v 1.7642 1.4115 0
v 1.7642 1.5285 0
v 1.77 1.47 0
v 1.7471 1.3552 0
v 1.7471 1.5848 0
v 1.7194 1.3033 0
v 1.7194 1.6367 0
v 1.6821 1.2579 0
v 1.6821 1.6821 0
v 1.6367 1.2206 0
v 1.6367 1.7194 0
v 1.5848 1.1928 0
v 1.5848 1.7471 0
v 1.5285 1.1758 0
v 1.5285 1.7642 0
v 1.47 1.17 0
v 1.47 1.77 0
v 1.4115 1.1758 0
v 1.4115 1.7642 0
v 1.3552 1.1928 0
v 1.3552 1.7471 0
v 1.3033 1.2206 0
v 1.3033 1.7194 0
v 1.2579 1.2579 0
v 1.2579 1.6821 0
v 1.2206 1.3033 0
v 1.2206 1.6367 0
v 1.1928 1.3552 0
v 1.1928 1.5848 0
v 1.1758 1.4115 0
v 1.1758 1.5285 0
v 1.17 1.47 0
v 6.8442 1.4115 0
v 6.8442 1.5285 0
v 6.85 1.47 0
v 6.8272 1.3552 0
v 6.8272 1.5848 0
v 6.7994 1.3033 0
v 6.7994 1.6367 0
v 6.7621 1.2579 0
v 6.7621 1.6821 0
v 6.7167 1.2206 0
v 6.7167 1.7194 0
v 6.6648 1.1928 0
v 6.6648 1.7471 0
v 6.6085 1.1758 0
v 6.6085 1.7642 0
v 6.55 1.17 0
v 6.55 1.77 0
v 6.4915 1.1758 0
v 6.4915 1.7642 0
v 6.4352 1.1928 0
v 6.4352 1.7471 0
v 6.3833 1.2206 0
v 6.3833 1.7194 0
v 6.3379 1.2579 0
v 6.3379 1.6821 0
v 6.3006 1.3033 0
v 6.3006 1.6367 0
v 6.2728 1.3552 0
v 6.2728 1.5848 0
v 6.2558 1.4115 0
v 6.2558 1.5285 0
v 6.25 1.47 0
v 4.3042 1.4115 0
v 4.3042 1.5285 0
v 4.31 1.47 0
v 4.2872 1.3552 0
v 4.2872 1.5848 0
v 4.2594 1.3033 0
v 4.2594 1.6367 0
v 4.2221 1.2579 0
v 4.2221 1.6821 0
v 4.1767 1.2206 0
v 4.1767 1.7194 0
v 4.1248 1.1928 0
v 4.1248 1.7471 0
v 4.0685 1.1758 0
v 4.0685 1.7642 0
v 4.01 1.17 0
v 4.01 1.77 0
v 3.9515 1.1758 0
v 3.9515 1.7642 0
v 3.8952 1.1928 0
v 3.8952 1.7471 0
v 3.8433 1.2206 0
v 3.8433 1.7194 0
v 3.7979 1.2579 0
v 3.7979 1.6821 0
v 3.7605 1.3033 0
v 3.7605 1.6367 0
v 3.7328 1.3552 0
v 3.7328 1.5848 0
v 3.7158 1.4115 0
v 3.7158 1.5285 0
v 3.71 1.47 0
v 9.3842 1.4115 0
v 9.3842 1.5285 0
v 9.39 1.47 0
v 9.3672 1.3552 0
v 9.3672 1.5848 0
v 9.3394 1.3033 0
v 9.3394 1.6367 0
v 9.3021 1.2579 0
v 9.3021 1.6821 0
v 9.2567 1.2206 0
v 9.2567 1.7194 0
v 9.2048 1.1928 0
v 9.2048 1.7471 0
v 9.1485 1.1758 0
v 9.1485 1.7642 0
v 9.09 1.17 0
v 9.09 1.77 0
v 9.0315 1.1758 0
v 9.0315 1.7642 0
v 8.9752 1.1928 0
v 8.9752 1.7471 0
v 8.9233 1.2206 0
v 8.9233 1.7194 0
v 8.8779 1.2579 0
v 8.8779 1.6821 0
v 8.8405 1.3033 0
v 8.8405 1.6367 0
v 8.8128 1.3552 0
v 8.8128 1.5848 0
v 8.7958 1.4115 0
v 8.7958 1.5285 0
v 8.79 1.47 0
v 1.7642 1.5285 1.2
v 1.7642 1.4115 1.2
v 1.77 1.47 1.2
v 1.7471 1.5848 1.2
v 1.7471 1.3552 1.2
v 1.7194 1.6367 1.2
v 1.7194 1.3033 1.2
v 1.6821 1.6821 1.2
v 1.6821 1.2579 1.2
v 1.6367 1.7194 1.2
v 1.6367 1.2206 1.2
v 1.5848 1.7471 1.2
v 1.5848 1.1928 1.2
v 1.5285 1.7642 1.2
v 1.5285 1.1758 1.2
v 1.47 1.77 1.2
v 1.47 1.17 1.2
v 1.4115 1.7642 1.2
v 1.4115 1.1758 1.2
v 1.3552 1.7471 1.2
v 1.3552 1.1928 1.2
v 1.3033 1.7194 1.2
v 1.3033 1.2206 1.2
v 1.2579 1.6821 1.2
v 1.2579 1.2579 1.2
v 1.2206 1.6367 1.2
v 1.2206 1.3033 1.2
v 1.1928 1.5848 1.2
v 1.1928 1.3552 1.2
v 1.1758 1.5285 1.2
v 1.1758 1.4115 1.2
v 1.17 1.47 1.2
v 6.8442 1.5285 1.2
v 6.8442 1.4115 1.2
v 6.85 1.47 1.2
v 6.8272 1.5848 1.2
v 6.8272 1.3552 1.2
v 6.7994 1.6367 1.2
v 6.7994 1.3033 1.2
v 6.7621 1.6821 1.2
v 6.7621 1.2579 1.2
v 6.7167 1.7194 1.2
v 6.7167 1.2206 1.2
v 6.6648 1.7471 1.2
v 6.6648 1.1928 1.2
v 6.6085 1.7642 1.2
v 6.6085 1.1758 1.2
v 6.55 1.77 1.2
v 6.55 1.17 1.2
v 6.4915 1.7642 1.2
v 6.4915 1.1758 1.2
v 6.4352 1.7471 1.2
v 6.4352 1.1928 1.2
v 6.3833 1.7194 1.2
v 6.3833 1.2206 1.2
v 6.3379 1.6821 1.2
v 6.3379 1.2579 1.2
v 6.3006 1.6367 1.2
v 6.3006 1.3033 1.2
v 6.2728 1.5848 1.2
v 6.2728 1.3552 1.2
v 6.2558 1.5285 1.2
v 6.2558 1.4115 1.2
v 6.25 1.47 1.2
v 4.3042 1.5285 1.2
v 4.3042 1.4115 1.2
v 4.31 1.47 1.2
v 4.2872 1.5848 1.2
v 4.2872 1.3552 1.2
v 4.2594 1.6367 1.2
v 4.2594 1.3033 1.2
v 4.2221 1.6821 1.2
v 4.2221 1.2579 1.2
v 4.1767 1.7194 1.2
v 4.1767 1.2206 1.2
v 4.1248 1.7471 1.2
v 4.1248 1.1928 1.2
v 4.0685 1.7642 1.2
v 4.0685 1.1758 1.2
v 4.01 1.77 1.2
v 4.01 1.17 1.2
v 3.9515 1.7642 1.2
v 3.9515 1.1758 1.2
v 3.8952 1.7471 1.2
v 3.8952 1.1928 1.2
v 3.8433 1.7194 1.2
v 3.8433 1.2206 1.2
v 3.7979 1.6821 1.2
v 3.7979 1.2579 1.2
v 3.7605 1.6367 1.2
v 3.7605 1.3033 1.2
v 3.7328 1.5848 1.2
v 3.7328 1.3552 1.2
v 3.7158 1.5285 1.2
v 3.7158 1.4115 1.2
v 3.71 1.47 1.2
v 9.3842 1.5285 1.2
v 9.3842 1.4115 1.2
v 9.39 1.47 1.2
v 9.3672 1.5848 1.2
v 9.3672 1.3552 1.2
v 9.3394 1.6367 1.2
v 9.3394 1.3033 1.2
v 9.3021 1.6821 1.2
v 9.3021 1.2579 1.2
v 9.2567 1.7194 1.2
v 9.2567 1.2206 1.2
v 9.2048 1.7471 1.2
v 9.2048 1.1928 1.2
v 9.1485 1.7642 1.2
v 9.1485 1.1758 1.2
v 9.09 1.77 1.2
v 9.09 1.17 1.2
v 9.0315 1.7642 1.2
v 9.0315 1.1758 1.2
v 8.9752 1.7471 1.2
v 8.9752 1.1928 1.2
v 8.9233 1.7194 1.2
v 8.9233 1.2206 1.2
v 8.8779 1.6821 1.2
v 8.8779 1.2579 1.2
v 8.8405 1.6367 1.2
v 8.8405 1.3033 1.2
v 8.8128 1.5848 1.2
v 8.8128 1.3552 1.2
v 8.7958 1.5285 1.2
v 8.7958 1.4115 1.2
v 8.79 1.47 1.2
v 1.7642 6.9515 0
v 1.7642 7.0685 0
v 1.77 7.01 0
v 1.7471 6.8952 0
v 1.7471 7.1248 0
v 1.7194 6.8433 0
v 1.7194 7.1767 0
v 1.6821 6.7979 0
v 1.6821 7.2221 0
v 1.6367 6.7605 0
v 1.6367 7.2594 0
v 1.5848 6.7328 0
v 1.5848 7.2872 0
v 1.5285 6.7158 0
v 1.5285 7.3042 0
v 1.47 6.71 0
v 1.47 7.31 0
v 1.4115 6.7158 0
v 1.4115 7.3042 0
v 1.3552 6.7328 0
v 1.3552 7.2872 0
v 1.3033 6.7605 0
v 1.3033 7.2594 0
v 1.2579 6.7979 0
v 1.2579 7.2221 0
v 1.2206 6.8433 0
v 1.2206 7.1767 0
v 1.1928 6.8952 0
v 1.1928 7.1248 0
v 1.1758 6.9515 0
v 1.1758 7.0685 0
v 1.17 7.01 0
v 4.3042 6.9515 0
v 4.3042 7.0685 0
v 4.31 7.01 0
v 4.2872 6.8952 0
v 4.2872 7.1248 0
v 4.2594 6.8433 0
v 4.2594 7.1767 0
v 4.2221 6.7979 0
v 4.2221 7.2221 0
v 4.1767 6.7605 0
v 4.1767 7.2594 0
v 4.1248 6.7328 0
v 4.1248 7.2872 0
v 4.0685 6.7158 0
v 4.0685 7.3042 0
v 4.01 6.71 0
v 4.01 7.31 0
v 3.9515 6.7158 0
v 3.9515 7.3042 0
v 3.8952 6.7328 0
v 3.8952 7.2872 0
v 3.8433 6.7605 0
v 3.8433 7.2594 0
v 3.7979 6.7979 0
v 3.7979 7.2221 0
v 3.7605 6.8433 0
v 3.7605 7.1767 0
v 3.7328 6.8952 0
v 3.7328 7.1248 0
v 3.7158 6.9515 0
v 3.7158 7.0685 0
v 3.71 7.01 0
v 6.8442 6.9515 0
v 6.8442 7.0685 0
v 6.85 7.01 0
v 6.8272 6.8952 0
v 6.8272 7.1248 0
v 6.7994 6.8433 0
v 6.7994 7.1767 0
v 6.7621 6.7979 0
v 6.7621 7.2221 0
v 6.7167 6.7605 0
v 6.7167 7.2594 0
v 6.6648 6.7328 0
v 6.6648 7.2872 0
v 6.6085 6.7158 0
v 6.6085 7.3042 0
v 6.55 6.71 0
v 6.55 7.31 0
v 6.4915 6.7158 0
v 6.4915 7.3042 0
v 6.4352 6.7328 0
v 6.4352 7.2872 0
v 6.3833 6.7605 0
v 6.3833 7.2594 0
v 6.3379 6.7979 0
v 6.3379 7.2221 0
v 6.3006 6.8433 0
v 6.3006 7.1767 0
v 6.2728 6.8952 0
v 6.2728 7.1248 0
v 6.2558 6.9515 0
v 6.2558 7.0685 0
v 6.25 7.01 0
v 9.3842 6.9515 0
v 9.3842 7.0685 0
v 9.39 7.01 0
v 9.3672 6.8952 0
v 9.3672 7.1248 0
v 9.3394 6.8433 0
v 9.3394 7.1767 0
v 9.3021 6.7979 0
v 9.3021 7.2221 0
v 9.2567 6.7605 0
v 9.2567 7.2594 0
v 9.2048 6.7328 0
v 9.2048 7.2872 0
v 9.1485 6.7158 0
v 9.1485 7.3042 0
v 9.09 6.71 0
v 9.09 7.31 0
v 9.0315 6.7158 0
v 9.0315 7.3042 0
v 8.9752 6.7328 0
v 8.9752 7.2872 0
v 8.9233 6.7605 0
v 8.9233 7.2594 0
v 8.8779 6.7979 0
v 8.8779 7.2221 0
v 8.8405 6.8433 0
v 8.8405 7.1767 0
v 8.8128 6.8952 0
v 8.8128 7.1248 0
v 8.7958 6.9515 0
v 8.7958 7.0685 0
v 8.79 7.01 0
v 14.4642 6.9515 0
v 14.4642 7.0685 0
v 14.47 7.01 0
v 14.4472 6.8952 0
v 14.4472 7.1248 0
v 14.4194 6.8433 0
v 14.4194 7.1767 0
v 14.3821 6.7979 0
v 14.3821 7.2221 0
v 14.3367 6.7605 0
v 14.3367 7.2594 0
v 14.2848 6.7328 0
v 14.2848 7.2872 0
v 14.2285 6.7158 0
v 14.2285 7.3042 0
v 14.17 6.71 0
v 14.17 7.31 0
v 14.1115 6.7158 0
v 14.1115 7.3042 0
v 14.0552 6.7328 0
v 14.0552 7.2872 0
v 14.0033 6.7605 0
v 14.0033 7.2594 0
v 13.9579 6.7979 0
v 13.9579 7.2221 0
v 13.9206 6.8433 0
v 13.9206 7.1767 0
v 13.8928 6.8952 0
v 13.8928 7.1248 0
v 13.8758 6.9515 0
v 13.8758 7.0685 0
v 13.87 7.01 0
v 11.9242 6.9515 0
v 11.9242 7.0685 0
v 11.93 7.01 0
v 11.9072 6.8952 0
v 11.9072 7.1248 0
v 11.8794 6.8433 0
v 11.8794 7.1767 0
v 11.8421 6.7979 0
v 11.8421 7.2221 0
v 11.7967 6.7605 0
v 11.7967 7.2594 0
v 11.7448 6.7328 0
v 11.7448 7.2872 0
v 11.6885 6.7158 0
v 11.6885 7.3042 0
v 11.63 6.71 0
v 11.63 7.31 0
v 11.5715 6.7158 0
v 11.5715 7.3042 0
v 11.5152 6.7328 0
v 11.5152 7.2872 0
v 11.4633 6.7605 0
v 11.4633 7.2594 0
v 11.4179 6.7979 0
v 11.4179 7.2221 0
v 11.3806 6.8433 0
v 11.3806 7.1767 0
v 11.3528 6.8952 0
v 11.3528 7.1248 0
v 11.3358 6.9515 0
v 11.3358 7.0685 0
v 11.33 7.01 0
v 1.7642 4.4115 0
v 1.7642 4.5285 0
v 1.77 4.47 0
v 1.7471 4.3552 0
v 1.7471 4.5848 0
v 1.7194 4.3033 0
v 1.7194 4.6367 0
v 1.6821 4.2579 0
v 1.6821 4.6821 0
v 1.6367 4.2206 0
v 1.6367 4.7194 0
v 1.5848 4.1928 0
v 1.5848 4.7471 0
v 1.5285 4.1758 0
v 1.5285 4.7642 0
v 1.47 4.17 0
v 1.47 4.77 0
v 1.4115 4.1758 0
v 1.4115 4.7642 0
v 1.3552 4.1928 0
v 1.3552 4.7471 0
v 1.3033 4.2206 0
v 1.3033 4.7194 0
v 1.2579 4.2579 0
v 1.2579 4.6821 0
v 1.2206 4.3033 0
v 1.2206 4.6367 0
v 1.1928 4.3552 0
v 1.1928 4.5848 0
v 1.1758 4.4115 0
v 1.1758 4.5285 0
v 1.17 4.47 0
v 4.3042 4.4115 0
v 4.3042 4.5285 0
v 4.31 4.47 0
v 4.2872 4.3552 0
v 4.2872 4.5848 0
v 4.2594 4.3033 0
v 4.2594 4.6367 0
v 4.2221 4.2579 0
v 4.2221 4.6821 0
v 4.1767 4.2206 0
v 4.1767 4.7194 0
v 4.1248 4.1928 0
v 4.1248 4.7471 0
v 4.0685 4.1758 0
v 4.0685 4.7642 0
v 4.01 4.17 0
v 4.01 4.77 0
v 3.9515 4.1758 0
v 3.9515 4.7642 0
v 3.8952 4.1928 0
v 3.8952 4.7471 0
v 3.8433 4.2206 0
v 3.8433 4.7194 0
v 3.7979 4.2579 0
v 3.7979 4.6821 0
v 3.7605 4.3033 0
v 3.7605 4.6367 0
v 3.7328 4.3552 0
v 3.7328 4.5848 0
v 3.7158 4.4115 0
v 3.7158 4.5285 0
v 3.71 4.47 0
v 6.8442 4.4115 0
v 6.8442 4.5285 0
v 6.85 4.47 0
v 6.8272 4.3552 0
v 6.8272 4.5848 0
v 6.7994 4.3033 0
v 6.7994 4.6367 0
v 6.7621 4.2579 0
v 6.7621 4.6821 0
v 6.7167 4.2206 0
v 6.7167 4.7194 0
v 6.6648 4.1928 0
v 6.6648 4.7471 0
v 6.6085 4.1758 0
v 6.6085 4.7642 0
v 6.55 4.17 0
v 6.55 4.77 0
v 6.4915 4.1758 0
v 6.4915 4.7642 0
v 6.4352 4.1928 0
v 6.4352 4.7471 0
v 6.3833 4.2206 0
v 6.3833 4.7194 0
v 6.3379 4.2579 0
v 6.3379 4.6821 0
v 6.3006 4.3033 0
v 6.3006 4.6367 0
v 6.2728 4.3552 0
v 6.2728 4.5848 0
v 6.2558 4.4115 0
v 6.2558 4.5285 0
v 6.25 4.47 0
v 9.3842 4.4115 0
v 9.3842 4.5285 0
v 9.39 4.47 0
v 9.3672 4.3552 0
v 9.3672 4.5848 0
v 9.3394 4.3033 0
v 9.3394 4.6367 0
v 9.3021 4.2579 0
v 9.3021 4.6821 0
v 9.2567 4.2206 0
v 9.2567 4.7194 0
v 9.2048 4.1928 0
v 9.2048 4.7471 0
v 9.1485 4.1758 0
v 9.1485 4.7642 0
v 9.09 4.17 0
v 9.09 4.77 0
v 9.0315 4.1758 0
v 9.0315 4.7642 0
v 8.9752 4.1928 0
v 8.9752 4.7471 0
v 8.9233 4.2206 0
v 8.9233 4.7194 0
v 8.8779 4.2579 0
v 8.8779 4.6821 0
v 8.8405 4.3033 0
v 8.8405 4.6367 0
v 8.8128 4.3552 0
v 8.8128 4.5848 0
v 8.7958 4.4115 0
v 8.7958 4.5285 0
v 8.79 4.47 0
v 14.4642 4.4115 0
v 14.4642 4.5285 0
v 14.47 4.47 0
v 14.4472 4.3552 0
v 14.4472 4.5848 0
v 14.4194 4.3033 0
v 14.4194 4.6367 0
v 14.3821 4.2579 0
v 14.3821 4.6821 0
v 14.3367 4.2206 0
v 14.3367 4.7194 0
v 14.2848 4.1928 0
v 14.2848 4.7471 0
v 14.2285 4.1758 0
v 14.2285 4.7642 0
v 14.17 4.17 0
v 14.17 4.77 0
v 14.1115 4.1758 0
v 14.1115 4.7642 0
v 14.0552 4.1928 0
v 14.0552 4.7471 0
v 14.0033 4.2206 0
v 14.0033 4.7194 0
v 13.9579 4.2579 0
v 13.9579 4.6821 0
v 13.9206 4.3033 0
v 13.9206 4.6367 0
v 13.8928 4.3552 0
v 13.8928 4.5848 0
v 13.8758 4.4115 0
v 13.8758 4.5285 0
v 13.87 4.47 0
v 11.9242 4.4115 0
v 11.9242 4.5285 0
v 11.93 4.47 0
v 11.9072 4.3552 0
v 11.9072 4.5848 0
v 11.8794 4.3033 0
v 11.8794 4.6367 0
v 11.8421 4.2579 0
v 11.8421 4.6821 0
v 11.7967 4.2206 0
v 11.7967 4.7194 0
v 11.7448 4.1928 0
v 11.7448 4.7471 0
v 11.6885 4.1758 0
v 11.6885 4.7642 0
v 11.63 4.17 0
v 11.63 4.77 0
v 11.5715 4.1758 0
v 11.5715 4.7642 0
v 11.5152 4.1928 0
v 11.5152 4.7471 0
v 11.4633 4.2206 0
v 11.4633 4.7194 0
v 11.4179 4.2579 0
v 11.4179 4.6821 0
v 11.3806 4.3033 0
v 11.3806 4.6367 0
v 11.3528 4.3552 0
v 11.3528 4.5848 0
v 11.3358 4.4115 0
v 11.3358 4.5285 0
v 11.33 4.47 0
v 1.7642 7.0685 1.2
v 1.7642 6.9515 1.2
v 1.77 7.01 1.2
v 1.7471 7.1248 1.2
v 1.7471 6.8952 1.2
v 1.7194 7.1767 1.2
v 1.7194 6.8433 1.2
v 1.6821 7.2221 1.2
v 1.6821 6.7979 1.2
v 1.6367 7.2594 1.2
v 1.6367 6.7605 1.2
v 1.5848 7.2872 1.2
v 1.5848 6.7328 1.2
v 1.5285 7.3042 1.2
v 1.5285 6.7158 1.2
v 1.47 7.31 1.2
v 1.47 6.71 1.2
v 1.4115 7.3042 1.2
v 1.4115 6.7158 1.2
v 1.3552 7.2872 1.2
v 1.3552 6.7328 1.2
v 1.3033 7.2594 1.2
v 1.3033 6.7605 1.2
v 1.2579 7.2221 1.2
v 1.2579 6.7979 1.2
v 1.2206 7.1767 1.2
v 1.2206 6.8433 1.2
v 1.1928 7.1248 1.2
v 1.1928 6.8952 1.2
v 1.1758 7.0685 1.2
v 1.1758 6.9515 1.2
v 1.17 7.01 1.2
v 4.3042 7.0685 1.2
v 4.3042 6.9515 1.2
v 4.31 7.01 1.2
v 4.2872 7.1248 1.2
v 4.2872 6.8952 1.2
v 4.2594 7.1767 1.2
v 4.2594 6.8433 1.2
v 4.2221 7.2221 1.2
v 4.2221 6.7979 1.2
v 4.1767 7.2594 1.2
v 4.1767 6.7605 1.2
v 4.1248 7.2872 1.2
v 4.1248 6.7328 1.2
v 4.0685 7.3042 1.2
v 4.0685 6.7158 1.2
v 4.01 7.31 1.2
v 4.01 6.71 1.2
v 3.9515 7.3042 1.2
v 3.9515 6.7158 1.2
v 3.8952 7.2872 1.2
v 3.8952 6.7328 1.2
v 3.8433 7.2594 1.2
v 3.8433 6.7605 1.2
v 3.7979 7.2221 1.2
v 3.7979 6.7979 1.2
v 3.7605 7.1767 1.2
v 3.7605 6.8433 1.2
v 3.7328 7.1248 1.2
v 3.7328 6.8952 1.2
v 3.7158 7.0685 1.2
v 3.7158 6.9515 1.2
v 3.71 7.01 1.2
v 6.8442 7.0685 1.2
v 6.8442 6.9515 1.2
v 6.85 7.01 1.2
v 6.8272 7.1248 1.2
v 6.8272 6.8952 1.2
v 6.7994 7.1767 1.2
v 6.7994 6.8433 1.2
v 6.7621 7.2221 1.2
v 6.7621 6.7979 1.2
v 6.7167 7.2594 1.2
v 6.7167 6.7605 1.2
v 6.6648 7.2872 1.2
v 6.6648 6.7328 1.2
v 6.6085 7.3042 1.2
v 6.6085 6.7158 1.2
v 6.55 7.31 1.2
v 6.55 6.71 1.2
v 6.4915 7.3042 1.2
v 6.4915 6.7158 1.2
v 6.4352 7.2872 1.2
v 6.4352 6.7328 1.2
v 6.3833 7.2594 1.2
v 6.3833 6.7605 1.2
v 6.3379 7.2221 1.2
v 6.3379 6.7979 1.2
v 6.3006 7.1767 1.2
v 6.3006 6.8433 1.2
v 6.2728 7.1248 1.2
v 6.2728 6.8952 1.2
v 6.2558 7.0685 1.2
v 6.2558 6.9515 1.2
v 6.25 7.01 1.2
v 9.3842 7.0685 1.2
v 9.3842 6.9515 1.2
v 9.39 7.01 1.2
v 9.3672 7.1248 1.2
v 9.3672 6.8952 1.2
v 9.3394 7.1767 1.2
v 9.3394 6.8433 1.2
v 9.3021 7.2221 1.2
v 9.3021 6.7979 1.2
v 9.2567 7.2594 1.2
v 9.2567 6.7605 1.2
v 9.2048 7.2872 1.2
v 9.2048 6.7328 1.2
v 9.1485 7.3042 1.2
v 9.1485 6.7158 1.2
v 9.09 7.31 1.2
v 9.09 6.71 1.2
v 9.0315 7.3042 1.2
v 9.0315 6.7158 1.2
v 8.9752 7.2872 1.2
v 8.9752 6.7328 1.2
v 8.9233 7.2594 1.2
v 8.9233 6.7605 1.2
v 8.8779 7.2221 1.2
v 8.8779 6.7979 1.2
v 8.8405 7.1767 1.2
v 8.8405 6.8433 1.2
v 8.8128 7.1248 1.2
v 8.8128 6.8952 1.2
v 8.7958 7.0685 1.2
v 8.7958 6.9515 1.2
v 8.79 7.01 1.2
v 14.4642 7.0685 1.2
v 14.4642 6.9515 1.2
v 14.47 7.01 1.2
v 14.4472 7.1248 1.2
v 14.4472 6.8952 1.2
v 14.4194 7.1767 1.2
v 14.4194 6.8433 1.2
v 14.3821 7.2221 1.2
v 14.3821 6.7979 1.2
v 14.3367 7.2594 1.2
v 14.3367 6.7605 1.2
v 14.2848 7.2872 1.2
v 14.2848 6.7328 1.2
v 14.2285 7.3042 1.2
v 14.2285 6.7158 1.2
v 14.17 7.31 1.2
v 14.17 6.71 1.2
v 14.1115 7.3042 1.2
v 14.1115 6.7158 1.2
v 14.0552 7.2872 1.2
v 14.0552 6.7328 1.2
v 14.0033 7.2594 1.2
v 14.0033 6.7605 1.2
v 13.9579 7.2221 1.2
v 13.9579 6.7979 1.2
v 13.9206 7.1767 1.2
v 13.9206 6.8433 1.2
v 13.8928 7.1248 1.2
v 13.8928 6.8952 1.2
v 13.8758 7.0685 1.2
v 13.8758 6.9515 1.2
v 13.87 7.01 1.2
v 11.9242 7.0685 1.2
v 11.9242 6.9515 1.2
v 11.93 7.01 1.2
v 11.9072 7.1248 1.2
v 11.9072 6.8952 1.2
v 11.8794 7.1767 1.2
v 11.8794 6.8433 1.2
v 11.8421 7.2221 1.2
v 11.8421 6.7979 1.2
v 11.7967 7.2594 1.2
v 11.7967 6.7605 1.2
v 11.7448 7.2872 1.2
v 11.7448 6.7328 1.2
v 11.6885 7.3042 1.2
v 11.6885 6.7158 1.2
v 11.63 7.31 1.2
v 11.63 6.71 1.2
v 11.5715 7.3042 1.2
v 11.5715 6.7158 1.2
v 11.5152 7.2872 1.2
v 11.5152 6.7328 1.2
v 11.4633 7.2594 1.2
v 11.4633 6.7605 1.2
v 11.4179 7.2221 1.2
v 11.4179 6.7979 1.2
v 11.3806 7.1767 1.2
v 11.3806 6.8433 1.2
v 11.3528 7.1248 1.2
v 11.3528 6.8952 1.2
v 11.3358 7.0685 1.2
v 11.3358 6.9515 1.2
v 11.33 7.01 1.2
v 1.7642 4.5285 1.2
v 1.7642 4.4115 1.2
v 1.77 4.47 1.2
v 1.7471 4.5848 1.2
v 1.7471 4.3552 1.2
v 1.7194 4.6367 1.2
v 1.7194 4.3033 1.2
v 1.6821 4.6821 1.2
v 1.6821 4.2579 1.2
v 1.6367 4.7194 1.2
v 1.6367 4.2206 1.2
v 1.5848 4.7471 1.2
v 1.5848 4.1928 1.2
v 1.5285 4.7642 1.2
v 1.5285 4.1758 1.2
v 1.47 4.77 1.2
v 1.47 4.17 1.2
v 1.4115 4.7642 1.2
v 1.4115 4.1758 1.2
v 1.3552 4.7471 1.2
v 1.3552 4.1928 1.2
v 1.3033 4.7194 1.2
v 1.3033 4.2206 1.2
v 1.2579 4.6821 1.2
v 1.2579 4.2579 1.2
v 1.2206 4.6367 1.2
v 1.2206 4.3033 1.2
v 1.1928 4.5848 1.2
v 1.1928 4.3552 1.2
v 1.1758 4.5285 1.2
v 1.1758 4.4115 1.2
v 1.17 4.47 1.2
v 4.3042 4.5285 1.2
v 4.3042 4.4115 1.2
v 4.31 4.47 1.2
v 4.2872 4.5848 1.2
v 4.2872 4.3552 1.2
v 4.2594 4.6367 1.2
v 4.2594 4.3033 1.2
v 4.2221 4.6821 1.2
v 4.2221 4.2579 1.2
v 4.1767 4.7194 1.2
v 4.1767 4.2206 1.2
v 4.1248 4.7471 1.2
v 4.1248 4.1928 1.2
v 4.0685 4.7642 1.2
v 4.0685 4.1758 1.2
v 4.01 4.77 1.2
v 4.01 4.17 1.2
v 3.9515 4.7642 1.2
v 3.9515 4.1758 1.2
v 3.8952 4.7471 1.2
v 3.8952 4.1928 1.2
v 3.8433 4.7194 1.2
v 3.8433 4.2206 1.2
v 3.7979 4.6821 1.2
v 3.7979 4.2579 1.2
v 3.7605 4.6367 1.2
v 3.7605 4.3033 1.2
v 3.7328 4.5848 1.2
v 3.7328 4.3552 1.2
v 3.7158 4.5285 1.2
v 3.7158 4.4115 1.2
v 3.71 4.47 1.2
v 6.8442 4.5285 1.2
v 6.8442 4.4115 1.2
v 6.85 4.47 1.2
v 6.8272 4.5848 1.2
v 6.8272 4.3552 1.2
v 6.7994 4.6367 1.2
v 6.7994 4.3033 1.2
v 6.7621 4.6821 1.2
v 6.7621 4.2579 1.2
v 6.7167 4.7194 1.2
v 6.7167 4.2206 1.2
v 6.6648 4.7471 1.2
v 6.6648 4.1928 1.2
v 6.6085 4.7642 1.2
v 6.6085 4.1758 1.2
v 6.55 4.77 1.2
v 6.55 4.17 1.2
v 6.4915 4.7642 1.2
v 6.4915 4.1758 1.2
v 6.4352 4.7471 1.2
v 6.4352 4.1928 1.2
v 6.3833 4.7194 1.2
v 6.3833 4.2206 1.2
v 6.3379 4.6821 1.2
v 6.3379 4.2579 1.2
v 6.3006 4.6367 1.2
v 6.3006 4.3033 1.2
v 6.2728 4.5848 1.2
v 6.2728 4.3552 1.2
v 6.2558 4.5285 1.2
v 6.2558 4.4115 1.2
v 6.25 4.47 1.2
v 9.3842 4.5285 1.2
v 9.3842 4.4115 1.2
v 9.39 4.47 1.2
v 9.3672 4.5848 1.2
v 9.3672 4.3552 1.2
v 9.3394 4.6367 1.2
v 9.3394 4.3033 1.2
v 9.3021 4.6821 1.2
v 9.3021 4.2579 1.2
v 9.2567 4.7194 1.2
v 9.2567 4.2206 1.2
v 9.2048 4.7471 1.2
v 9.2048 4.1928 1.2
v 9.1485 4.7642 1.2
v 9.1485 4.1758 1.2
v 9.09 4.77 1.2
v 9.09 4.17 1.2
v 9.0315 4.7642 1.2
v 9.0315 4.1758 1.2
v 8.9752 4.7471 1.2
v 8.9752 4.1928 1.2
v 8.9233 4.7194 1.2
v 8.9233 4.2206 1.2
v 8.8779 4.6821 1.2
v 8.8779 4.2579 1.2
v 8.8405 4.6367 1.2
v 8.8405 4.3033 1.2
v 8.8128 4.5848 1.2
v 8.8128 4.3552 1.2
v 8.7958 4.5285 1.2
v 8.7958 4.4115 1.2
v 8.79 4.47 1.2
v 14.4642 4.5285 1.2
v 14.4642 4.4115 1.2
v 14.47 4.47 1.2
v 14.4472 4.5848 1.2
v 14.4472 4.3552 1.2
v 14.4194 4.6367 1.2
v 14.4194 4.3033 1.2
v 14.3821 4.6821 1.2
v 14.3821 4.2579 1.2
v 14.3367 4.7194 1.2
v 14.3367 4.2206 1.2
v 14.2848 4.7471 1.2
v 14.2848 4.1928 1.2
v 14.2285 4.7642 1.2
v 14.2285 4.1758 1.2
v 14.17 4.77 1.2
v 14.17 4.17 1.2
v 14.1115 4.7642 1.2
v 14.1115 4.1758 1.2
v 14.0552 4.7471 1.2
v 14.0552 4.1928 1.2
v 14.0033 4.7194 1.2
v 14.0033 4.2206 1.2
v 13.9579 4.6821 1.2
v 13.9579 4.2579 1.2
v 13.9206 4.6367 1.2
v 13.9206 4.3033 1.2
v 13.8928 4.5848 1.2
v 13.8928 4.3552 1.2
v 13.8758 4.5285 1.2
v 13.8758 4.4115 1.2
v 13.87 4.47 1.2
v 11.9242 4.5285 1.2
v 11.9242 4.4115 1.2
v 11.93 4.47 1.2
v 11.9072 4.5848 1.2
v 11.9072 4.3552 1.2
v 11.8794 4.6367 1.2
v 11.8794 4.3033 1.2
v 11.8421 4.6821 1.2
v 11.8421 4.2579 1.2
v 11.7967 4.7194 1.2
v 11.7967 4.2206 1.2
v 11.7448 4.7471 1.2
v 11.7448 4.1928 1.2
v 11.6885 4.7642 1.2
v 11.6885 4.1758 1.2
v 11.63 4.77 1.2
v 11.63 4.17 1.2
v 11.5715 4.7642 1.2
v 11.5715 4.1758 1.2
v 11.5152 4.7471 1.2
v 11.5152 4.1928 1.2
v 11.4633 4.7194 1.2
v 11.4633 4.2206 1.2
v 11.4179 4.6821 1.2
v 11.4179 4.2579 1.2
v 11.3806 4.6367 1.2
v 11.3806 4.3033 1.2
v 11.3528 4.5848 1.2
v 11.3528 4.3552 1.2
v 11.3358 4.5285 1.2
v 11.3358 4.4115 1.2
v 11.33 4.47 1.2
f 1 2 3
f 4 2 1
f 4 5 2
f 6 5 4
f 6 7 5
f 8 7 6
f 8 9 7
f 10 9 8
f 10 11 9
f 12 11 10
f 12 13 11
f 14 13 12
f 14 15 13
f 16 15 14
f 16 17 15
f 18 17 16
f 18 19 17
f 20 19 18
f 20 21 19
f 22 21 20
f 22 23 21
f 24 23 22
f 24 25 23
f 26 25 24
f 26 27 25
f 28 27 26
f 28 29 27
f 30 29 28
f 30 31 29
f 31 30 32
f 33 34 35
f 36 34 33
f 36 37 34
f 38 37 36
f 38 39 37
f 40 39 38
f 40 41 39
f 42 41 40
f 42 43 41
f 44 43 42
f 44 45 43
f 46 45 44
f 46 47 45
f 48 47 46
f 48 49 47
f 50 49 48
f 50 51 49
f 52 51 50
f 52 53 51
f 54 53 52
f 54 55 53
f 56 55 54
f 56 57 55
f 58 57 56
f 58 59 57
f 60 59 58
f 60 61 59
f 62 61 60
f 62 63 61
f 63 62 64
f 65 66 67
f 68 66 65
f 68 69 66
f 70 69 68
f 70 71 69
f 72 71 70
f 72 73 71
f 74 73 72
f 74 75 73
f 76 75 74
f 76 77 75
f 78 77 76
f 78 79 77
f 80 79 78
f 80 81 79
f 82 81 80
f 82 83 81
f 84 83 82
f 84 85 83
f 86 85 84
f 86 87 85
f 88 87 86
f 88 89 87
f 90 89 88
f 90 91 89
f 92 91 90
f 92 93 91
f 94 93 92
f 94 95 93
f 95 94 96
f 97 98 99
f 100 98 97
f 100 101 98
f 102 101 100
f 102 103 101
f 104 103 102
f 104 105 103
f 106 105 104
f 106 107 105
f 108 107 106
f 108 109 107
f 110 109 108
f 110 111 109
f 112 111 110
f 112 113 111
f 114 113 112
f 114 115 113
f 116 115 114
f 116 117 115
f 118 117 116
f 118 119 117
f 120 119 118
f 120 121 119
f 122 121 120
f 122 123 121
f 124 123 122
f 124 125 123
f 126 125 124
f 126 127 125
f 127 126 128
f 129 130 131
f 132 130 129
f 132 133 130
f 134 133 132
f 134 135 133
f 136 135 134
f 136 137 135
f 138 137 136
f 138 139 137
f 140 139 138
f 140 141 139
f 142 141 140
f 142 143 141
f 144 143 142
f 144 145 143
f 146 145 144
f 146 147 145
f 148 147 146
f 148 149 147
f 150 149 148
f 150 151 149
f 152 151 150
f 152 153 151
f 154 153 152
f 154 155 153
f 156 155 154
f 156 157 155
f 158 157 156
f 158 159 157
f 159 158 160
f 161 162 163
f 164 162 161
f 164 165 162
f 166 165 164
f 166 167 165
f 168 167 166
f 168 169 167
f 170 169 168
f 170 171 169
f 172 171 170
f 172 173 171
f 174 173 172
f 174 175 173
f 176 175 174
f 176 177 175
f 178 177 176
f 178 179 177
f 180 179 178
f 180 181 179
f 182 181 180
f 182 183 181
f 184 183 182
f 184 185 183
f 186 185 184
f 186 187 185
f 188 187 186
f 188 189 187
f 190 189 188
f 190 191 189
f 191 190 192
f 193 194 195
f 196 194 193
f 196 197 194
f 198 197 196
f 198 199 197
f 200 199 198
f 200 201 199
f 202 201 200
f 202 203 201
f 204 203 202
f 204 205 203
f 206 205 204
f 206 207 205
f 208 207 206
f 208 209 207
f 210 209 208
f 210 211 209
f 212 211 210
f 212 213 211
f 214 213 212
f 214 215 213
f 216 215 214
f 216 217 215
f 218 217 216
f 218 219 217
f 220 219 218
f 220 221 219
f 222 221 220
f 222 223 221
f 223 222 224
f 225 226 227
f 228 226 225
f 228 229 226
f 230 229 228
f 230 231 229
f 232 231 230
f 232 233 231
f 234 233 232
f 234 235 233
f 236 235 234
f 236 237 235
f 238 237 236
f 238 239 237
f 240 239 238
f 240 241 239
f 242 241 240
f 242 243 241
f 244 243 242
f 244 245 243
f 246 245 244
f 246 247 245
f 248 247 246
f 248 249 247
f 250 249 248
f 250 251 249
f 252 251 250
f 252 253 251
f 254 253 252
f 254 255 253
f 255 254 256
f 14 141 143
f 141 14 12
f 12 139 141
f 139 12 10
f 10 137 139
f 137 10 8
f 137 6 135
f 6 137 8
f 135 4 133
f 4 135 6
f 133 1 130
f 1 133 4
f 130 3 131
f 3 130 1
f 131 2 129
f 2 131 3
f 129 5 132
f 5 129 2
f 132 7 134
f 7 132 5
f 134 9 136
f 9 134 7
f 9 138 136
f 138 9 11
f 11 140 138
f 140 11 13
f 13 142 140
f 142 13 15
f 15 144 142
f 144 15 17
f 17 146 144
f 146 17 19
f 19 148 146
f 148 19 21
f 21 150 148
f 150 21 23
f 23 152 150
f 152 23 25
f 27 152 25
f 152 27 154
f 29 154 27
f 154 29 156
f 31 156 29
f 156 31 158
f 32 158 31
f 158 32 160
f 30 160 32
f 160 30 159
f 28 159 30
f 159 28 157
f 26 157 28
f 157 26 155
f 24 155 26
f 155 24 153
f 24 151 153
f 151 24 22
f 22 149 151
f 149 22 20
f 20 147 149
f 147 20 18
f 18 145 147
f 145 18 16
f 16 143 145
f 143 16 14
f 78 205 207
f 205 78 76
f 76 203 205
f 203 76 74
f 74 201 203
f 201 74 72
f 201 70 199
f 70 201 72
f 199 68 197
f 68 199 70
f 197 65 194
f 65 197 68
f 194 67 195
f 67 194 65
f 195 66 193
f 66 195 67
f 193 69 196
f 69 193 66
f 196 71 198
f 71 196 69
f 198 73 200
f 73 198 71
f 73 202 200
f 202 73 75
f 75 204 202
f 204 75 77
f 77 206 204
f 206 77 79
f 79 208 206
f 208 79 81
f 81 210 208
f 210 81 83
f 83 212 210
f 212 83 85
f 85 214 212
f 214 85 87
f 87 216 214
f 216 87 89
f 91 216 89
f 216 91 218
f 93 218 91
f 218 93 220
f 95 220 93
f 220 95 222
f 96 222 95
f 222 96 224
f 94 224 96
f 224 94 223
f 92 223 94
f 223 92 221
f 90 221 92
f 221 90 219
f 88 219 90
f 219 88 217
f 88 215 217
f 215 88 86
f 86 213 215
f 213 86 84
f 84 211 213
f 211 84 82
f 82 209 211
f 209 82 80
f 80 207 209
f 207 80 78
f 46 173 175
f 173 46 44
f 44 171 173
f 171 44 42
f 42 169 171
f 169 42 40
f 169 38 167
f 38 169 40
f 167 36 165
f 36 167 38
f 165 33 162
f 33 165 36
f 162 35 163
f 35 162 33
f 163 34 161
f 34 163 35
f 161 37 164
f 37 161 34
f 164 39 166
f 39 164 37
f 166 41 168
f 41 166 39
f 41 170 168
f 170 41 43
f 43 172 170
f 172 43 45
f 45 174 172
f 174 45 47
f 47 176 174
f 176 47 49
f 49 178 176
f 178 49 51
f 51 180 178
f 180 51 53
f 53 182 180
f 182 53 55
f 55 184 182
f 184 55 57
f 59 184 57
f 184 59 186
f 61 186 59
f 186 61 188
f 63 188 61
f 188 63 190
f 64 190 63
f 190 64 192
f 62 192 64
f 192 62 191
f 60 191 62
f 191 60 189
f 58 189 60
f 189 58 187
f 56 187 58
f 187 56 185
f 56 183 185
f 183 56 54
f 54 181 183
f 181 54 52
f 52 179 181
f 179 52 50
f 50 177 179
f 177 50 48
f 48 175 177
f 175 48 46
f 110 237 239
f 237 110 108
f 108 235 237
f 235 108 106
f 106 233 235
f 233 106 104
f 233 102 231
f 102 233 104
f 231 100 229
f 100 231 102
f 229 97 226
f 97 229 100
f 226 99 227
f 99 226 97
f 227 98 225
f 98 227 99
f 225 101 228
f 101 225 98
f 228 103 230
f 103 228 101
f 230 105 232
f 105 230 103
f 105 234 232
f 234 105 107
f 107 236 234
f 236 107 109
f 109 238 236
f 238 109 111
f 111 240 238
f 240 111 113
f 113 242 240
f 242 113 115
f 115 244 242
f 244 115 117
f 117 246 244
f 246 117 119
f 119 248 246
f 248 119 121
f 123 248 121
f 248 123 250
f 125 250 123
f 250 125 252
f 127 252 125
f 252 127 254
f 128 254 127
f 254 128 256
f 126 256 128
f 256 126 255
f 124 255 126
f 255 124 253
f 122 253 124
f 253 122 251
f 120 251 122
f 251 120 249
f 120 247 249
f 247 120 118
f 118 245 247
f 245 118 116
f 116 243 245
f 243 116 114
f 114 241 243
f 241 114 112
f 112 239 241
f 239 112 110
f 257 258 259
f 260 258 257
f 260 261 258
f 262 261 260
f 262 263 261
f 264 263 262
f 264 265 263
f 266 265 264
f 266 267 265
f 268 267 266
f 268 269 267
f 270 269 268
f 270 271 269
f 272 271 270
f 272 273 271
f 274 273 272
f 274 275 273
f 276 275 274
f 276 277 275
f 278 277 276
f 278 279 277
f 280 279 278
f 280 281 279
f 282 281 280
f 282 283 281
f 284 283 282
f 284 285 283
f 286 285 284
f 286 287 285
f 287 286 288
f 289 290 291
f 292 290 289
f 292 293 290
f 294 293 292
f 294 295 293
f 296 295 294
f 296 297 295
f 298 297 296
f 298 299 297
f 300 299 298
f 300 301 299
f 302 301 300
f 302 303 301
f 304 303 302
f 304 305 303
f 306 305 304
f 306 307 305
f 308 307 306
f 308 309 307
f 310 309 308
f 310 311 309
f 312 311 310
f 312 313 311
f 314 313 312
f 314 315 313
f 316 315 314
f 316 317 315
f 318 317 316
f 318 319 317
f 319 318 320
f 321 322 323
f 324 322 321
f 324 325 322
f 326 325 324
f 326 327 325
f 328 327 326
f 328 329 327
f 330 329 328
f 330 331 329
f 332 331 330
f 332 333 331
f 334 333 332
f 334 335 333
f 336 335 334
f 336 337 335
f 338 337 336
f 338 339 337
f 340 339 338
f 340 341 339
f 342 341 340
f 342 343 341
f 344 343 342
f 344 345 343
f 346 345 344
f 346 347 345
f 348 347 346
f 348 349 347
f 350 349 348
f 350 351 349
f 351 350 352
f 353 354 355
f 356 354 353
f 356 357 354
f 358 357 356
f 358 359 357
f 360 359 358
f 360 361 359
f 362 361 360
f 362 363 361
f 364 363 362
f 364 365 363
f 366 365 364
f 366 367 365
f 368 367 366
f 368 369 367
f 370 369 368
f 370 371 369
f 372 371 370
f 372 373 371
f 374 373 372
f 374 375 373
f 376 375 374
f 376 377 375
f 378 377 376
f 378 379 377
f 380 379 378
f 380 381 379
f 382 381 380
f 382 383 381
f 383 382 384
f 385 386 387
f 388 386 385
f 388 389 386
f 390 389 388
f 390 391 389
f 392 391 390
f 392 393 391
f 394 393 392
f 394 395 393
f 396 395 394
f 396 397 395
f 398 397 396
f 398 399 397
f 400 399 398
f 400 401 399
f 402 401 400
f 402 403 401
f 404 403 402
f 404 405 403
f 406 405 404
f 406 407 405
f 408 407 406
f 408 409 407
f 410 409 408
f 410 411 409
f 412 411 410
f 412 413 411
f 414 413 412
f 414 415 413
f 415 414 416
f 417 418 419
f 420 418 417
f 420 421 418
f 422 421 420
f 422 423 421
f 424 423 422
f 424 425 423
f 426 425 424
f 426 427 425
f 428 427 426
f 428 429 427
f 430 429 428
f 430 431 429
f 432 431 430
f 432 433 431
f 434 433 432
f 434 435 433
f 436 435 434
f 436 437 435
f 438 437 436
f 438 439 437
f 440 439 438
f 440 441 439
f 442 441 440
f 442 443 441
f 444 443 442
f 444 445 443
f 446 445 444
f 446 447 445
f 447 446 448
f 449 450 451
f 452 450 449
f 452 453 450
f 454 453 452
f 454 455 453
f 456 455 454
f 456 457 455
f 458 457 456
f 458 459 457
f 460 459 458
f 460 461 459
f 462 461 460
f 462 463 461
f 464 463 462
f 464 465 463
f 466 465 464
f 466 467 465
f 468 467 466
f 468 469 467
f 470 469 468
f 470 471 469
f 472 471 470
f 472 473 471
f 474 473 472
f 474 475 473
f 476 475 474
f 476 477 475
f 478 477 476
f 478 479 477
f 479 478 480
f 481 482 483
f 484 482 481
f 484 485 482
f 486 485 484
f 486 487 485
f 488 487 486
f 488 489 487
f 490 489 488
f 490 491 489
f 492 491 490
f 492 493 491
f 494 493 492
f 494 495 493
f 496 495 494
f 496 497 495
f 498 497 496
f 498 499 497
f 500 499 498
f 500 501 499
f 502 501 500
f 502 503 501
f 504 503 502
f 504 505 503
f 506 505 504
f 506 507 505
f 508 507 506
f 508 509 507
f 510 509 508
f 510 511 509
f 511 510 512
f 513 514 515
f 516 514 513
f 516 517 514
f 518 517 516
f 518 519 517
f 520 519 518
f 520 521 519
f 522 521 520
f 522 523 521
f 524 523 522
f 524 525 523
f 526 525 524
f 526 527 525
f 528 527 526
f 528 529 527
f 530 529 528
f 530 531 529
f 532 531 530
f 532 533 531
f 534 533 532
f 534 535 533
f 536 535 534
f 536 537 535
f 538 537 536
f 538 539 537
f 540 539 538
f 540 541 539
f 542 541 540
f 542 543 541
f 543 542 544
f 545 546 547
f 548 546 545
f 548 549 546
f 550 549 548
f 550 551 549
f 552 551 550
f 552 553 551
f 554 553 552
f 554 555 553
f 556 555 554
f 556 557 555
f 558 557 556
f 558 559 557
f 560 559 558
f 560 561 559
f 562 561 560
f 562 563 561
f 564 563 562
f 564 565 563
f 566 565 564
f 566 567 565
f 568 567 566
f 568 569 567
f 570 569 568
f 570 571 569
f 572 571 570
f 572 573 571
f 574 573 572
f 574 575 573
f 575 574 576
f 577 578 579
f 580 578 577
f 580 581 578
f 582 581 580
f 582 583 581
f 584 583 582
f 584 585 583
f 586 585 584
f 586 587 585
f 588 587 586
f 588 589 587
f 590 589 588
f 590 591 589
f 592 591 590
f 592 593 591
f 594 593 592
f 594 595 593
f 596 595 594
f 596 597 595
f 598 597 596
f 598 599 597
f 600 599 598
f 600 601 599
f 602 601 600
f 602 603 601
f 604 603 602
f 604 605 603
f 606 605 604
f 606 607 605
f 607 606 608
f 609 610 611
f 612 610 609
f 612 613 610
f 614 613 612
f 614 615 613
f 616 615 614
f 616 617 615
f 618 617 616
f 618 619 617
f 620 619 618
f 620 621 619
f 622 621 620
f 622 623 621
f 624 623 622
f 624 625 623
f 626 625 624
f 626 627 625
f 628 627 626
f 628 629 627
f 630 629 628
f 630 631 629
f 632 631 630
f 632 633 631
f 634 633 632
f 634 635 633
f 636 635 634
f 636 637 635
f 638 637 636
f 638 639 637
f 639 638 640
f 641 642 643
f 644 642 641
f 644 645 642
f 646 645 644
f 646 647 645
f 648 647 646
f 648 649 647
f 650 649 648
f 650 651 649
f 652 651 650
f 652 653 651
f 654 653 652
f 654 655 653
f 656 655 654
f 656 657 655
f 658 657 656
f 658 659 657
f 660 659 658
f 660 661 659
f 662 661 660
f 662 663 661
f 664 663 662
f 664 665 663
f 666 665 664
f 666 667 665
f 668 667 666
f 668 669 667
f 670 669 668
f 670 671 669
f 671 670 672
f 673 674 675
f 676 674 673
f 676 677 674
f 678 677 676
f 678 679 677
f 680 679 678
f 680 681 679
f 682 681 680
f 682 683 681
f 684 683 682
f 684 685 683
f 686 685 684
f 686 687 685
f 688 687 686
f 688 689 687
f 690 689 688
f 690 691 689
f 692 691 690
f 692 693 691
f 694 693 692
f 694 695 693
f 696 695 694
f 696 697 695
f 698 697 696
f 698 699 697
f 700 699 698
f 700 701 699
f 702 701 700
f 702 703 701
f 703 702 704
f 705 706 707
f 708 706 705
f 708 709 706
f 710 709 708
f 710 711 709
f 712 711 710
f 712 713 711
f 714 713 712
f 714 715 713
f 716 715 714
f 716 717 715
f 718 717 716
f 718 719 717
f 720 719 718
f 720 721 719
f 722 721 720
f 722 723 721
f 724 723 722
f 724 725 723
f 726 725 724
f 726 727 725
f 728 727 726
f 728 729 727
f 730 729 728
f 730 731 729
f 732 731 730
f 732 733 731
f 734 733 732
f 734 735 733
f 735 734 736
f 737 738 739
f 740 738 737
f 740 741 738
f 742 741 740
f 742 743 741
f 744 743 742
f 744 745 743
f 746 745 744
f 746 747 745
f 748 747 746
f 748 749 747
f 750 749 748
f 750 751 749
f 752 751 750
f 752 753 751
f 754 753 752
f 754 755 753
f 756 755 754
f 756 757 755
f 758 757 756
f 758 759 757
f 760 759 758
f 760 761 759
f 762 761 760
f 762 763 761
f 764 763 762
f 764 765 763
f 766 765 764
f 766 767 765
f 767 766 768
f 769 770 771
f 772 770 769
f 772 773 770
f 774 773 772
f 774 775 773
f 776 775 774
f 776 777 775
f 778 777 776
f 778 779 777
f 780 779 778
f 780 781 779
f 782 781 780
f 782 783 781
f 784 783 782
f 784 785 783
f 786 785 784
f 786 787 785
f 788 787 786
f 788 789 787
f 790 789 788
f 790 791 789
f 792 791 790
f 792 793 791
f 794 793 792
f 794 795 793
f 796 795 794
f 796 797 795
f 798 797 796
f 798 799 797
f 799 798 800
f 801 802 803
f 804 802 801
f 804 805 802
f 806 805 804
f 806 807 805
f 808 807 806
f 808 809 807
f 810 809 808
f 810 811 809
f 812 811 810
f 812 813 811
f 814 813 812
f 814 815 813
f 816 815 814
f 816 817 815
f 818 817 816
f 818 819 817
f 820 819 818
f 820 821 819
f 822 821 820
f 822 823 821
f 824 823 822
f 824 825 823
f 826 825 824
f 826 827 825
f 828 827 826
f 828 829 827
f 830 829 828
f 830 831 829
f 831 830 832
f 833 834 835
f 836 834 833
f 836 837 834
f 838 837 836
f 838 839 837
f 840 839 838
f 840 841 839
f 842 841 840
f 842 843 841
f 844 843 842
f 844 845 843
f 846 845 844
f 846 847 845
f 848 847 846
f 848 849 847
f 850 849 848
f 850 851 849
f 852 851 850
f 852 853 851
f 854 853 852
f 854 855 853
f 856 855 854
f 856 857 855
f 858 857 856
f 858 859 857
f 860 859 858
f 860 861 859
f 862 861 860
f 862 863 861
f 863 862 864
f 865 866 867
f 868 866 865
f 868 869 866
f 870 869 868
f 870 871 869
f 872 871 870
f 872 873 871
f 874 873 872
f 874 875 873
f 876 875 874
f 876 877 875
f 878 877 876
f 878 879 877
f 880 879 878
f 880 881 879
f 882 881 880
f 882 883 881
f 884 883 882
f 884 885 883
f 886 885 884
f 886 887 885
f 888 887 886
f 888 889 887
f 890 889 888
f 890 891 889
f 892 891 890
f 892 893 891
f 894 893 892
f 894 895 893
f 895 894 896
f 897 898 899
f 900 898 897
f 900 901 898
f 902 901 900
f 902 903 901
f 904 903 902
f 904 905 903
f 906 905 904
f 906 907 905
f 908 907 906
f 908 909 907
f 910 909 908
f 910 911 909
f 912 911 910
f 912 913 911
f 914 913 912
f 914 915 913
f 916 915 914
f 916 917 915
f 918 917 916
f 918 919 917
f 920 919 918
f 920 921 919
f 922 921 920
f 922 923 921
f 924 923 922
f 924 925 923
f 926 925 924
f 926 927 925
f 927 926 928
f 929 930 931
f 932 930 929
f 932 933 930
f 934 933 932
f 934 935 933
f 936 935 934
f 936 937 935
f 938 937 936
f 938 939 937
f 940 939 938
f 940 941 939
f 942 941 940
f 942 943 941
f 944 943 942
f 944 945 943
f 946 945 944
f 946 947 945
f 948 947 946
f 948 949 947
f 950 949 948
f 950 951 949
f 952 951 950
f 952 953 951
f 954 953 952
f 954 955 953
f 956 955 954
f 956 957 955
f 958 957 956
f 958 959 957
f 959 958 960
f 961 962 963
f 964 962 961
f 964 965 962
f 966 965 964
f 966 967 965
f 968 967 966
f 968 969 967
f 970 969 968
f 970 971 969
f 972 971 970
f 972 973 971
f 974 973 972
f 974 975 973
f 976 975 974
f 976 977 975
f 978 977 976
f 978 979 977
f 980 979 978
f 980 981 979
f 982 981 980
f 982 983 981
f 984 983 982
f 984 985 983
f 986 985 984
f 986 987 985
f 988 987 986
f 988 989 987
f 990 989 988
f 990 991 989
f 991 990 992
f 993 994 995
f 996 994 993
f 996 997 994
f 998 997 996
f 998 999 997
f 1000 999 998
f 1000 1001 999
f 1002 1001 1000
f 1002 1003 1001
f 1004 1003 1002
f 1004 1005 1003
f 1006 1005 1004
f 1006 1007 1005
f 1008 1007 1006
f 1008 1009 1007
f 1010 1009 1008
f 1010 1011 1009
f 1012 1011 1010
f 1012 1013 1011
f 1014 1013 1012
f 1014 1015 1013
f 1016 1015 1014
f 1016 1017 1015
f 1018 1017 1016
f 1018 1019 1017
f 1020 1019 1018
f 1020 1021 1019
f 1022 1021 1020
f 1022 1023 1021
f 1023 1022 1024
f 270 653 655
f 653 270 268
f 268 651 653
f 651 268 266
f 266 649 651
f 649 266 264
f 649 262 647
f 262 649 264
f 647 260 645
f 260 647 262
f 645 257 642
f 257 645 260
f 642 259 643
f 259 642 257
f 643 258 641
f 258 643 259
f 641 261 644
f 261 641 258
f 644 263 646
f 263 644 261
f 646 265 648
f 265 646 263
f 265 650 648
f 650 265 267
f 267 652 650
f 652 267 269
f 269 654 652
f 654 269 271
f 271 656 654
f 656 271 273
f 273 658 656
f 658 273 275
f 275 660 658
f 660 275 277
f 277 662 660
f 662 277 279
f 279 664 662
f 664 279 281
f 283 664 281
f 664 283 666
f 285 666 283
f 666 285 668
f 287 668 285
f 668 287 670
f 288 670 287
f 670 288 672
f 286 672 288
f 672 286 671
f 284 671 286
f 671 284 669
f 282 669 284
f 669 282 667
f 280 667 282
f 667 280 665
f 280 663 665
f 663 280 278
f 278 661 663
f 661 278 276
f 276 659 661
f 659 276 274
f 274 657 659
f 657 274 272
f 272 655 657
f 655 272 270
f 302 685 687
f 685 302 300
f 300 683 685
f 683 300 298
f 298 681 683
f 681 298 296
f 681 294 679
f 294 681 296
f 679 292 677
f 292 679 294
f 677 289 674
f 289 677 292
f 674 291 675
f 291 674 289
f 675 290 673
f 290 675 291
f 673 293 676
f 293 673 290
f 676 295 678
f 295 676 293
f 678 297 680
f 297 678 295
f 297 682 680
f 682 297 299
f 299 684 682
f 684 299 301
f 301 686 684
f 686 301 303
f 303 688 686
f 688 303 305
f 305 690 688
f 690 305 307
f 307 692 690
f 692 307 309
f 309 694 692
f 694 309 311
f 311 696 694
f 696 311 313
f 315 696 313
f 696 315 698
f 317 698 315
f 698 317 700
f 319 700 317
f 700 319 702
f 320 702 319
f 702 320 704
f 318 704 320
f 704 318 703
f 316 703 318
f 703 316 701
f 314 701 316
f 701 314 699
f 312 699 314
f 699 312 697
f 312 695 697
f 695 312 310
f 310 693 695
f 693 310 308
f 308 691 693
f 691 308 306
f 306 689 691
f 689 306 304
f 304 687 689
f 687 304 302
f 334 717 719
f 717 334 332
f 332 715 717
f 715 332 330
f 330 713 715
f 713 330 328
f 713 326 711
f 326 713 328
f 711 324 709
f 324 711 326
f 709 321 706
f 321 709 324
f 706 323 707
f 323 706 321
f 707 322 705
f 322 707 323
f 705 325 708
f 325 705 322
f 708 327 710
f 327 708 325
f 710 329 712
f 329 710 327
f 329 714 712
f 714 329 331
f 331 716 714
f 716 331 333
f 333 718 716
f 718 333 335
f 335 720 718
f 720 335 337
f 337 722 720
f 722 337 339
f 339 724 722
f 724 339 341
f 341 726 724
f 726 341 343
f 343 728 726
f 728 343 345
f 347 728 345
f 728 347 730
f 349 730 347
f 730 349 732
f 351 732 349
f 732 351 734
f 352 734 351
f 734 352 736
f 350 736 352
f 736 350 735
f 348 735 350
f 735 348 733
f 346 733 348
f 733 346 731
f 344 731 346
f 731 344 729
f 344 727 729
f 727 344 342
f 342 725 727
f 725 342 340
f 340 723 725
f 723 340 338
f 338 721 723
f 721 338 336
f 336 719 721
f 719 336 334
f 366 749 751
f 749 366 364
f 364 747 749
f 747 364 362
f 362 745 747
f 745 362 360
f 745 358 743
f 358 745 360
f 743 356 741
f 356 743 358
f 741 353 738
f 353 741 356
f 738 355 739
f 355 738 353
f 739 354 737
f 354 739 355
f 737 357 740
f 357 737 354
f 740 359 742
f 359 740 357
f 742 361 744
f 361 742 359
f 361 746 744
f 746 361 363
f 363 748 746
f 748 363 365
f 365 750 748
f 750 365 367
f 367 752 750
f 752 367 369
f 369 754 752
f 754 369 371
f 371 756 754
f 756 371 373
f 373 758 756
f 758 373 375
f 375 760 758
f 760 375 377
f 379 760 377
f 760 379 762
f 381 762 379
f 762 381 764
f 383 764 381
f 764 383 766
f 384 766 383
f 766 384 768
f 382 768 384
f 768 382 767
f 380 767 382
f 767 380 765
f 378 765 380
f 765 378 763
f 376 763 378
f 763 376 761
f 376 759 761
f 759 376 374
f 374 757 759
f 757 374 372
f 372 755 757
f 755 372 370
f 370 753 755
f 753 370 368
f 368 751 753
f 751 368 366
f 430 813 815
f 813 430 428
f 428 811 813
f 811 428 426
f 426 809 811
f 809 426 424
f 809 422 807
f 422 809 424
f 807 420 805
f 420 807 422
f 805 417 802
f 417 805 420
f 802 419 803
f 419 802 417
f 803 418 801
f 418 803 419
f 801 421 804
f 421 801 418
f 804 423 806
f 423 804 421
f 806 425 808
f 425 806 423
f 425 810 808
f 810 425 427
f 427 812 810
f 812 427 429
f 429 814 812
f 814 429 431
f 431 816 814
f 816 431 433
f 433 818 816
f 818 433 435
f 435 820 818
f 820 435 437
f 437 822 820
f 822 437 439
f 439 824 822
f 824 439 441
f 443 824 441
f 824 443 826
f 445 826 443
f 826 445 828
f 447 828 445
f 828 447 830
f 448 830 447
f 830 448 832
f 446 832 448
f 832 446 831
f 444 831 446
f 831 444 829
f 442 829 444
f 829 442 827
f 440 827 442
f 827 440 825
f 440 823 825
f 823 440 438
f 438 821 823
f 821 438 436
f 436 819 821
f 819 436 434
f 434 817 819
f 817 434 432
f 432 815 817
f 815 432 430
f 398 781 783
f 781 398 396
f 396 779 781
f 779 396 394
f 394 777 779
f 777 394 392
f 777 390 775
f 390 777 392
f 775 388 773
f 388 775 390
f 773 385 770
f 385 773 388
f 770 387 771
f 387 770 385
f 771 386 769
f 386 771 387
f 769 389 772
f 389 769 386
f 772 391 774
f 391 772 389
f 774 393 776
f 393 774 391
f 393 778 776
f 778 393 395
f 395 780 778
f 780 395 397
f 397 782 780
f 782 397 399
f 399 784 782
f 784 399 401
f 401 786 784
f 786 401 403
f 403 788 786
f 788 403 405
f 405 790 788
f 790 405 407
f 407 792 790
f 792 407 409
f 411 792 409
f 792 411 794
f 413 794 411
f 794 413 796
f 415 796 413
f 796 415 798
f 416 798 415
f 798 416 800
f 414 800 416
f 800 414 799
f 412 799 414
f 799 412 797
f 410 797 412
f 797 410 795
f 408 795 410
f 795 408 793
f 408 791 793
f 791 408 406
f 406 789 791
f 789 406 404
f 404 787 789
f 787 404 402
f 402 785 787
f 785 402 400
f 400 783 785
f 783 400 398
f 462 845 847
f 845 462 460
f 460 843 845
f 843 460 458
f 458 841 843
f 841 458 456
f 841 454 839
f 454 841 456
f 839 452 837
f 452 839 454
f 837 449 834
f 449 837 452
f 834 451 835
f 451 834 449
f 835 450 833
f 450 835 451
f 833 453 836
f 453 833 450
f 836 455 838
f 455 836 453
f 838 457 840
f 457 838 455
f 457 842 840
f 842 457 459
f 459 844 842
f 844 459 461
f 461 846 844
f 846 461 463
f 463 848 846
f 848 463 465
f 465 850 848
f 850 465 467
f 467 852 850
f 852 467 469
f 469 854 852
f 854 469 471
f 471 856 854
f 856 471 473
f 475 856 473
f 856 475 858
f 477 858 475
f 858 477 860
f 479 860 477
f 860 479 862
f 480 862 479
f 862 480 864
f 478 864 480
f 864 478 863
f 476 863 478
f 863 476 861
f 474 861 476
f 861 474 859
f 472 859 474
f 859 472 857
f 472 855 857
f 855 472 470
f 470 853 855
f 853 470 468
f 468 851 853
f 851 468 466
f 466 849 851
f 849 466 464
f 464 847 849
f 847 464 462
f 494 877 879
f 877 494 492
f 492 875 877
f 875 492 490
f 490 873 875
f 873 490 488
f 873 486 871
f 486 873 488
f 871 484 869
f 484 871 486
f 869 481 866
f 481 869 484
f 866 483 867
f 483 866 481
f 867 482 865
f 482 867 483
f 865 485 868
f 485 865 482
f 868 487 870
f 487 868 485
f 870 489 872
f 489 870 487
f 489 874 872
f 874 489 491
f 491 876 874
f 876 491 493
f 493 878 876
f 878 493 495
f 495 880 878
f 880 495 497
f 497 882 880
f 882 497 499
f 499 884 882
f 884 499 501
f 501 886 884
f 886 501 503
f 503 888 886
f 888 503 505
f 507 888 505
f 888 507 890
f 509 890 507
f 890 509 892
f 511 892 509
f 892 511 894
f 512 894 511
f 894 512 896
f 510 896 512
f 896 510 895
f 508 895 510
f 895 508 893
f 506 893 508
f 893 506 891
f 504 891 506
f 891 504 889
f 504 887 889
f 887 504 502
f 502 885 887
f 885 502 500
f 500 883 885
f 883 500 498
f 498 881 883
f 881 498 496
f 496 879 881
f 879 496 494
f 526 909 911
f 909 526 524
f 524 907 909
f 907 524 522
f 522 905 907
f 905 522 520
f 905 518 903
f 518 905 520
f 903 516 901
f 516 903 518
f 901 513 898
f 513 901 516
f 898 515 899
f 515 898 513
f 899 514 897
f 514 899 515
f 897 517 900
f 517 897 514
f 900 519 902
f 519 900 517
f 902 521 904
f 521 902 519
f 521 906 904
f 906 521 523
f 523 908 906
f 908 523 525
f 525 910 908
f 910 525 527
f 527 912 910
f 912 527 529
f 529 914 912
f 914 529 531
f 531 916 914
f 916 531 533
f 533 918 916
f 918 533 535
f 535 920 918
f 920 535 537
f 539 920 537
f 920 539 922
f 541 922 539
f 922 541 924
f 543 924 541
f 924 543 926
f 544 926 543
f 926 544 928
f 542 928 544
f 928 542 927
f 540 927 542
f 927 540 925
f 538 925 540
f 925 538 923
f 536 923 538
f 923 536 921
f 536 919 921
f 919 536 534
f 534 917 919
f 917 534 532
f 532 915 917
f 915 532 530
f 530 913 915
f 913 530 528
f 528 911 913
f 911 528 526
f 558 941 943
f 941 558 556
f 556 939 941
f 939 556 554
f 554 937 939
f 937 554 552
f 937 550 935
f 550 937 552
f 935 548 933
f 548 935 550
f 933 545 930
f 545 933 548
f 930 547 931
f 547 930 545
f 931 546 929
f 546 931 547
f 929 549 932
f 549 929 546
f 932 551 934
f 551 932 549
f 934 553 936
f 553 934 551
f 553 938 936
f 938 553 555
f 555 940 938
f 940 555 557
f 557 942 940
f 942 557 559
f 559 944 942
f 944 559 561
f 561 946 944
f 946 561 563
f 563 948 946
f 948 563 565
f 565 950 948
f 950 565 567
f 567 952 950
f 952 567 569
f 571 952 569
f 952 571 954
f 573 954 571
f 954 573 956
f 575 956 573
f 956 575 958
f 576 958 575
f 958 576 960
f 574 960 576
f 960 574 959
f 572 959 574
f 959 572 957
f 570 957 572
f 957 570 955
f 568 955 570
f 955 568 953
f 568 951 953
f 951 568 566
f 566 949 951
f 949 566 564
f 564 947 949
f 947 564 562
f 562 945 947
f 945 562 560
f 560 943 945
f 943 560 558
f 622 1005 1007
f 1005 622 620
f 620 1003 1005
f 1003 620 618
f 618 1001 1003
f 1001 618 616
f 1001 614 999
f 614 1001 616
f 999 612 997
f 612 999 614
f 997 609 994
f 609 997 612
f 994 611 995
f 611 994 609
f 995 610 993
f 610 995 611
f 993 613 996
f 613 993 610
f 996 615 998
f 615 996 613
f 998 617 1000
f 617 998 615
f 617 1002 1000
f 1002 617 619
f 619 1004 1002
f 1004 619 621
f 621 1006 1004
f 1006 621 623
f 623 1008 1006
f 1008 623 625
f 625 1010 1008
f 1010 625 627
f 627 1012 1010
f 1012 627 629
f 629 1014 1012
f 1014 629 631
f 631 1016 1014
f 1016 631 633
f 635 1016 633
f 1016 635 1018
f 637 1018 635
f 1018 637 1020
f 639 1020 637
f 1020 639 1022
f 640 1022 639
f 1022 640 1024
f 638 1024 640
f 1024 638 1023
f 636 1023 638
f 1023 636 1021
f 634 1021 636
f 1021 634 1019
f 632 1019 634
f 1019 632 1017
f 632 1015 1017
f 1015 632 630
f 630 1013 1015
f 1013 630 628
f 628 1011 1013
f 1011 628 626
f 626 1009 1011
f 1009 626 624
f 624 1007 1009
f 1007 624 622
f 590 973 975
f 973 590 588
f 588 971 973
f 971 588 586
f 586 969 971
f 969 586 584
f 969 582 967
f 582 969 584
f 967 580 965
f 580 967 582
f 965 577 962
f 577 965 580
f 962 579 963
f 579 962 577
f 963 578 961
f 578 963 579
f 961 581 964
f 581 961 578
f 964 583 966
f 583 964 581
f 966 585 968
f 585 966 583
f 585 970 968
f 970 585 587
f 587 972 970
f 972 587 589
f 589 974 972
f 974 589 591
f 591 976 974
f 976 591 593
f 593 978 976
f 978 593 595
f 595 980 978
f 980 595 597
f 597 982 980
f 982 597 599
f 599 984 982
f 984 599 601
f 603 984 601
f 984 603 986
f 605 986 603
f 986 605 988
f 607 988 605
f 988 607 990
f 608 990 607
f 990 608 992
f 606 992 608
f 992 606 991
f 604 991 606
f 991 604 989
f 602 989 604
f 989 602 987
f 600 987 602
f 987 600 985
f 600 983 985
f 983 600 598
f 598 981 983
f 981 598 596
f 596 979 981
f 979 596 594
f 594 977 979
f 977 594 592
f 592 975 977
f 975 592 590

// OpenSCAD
/* +--------------+
 * |              |
 * |    AHT20     |
 * |              |
 * |              |
 * |              |
 * |  1  2  3  4  |
 * |  *  *  *  *  |
 * |              |
 * +--------------+
 *
 * Example pin numbering above with headers pointed away from you
 */

aht20_dim = [10.5,15.0];
aht20_pins = ["Vcc","GND","SCL","SDA"];

scd40_dim = [13.4,23.6];
scd40_pins = ["SDA","SCL","Vcc","GND"];

ssd1306_dim = [27,28];
ssd1306_pins = ["GND","Vcc","SCL","SDA"];

pcb_thickness = 1.2;
inch = 25.4; // mm
header_pitch = inch/10;
header_dia = 0.6;
skip = inch / 2;

// 2D
module headers(x, y=1, pitch=header_pitch, dia=header_dia, border=0, borderw=0.2) {
    if (border > 0) {
        difference() {
            square([x*pitch+borderw*2,y*pitch+borderw*2]);
            translate([borderw,borderw]) {
                square([x*pitch,y*pitch]);
            }
        }
    }
    translate([borderw,borderw]) {
        for (xx = [0:x-1]) {
            for (yy = [0:y-1]) {
                echo(dia/2+(pitch-dia)/2);
                translate([dia/2+(pitch-dia)/2+xx*pitch,dia/2+(pitch-dia)/2+yy*pitch]) {
                    circle(d=dia, $fn=32);
                }
            }
        }
    }
}

// 3D
linear_extrude(pcb_thickness) {
    headers(4);
}
translate([0,3]) {
    linear_extrude(pcb_thickness) {
        headers(6,2);
    }
}
